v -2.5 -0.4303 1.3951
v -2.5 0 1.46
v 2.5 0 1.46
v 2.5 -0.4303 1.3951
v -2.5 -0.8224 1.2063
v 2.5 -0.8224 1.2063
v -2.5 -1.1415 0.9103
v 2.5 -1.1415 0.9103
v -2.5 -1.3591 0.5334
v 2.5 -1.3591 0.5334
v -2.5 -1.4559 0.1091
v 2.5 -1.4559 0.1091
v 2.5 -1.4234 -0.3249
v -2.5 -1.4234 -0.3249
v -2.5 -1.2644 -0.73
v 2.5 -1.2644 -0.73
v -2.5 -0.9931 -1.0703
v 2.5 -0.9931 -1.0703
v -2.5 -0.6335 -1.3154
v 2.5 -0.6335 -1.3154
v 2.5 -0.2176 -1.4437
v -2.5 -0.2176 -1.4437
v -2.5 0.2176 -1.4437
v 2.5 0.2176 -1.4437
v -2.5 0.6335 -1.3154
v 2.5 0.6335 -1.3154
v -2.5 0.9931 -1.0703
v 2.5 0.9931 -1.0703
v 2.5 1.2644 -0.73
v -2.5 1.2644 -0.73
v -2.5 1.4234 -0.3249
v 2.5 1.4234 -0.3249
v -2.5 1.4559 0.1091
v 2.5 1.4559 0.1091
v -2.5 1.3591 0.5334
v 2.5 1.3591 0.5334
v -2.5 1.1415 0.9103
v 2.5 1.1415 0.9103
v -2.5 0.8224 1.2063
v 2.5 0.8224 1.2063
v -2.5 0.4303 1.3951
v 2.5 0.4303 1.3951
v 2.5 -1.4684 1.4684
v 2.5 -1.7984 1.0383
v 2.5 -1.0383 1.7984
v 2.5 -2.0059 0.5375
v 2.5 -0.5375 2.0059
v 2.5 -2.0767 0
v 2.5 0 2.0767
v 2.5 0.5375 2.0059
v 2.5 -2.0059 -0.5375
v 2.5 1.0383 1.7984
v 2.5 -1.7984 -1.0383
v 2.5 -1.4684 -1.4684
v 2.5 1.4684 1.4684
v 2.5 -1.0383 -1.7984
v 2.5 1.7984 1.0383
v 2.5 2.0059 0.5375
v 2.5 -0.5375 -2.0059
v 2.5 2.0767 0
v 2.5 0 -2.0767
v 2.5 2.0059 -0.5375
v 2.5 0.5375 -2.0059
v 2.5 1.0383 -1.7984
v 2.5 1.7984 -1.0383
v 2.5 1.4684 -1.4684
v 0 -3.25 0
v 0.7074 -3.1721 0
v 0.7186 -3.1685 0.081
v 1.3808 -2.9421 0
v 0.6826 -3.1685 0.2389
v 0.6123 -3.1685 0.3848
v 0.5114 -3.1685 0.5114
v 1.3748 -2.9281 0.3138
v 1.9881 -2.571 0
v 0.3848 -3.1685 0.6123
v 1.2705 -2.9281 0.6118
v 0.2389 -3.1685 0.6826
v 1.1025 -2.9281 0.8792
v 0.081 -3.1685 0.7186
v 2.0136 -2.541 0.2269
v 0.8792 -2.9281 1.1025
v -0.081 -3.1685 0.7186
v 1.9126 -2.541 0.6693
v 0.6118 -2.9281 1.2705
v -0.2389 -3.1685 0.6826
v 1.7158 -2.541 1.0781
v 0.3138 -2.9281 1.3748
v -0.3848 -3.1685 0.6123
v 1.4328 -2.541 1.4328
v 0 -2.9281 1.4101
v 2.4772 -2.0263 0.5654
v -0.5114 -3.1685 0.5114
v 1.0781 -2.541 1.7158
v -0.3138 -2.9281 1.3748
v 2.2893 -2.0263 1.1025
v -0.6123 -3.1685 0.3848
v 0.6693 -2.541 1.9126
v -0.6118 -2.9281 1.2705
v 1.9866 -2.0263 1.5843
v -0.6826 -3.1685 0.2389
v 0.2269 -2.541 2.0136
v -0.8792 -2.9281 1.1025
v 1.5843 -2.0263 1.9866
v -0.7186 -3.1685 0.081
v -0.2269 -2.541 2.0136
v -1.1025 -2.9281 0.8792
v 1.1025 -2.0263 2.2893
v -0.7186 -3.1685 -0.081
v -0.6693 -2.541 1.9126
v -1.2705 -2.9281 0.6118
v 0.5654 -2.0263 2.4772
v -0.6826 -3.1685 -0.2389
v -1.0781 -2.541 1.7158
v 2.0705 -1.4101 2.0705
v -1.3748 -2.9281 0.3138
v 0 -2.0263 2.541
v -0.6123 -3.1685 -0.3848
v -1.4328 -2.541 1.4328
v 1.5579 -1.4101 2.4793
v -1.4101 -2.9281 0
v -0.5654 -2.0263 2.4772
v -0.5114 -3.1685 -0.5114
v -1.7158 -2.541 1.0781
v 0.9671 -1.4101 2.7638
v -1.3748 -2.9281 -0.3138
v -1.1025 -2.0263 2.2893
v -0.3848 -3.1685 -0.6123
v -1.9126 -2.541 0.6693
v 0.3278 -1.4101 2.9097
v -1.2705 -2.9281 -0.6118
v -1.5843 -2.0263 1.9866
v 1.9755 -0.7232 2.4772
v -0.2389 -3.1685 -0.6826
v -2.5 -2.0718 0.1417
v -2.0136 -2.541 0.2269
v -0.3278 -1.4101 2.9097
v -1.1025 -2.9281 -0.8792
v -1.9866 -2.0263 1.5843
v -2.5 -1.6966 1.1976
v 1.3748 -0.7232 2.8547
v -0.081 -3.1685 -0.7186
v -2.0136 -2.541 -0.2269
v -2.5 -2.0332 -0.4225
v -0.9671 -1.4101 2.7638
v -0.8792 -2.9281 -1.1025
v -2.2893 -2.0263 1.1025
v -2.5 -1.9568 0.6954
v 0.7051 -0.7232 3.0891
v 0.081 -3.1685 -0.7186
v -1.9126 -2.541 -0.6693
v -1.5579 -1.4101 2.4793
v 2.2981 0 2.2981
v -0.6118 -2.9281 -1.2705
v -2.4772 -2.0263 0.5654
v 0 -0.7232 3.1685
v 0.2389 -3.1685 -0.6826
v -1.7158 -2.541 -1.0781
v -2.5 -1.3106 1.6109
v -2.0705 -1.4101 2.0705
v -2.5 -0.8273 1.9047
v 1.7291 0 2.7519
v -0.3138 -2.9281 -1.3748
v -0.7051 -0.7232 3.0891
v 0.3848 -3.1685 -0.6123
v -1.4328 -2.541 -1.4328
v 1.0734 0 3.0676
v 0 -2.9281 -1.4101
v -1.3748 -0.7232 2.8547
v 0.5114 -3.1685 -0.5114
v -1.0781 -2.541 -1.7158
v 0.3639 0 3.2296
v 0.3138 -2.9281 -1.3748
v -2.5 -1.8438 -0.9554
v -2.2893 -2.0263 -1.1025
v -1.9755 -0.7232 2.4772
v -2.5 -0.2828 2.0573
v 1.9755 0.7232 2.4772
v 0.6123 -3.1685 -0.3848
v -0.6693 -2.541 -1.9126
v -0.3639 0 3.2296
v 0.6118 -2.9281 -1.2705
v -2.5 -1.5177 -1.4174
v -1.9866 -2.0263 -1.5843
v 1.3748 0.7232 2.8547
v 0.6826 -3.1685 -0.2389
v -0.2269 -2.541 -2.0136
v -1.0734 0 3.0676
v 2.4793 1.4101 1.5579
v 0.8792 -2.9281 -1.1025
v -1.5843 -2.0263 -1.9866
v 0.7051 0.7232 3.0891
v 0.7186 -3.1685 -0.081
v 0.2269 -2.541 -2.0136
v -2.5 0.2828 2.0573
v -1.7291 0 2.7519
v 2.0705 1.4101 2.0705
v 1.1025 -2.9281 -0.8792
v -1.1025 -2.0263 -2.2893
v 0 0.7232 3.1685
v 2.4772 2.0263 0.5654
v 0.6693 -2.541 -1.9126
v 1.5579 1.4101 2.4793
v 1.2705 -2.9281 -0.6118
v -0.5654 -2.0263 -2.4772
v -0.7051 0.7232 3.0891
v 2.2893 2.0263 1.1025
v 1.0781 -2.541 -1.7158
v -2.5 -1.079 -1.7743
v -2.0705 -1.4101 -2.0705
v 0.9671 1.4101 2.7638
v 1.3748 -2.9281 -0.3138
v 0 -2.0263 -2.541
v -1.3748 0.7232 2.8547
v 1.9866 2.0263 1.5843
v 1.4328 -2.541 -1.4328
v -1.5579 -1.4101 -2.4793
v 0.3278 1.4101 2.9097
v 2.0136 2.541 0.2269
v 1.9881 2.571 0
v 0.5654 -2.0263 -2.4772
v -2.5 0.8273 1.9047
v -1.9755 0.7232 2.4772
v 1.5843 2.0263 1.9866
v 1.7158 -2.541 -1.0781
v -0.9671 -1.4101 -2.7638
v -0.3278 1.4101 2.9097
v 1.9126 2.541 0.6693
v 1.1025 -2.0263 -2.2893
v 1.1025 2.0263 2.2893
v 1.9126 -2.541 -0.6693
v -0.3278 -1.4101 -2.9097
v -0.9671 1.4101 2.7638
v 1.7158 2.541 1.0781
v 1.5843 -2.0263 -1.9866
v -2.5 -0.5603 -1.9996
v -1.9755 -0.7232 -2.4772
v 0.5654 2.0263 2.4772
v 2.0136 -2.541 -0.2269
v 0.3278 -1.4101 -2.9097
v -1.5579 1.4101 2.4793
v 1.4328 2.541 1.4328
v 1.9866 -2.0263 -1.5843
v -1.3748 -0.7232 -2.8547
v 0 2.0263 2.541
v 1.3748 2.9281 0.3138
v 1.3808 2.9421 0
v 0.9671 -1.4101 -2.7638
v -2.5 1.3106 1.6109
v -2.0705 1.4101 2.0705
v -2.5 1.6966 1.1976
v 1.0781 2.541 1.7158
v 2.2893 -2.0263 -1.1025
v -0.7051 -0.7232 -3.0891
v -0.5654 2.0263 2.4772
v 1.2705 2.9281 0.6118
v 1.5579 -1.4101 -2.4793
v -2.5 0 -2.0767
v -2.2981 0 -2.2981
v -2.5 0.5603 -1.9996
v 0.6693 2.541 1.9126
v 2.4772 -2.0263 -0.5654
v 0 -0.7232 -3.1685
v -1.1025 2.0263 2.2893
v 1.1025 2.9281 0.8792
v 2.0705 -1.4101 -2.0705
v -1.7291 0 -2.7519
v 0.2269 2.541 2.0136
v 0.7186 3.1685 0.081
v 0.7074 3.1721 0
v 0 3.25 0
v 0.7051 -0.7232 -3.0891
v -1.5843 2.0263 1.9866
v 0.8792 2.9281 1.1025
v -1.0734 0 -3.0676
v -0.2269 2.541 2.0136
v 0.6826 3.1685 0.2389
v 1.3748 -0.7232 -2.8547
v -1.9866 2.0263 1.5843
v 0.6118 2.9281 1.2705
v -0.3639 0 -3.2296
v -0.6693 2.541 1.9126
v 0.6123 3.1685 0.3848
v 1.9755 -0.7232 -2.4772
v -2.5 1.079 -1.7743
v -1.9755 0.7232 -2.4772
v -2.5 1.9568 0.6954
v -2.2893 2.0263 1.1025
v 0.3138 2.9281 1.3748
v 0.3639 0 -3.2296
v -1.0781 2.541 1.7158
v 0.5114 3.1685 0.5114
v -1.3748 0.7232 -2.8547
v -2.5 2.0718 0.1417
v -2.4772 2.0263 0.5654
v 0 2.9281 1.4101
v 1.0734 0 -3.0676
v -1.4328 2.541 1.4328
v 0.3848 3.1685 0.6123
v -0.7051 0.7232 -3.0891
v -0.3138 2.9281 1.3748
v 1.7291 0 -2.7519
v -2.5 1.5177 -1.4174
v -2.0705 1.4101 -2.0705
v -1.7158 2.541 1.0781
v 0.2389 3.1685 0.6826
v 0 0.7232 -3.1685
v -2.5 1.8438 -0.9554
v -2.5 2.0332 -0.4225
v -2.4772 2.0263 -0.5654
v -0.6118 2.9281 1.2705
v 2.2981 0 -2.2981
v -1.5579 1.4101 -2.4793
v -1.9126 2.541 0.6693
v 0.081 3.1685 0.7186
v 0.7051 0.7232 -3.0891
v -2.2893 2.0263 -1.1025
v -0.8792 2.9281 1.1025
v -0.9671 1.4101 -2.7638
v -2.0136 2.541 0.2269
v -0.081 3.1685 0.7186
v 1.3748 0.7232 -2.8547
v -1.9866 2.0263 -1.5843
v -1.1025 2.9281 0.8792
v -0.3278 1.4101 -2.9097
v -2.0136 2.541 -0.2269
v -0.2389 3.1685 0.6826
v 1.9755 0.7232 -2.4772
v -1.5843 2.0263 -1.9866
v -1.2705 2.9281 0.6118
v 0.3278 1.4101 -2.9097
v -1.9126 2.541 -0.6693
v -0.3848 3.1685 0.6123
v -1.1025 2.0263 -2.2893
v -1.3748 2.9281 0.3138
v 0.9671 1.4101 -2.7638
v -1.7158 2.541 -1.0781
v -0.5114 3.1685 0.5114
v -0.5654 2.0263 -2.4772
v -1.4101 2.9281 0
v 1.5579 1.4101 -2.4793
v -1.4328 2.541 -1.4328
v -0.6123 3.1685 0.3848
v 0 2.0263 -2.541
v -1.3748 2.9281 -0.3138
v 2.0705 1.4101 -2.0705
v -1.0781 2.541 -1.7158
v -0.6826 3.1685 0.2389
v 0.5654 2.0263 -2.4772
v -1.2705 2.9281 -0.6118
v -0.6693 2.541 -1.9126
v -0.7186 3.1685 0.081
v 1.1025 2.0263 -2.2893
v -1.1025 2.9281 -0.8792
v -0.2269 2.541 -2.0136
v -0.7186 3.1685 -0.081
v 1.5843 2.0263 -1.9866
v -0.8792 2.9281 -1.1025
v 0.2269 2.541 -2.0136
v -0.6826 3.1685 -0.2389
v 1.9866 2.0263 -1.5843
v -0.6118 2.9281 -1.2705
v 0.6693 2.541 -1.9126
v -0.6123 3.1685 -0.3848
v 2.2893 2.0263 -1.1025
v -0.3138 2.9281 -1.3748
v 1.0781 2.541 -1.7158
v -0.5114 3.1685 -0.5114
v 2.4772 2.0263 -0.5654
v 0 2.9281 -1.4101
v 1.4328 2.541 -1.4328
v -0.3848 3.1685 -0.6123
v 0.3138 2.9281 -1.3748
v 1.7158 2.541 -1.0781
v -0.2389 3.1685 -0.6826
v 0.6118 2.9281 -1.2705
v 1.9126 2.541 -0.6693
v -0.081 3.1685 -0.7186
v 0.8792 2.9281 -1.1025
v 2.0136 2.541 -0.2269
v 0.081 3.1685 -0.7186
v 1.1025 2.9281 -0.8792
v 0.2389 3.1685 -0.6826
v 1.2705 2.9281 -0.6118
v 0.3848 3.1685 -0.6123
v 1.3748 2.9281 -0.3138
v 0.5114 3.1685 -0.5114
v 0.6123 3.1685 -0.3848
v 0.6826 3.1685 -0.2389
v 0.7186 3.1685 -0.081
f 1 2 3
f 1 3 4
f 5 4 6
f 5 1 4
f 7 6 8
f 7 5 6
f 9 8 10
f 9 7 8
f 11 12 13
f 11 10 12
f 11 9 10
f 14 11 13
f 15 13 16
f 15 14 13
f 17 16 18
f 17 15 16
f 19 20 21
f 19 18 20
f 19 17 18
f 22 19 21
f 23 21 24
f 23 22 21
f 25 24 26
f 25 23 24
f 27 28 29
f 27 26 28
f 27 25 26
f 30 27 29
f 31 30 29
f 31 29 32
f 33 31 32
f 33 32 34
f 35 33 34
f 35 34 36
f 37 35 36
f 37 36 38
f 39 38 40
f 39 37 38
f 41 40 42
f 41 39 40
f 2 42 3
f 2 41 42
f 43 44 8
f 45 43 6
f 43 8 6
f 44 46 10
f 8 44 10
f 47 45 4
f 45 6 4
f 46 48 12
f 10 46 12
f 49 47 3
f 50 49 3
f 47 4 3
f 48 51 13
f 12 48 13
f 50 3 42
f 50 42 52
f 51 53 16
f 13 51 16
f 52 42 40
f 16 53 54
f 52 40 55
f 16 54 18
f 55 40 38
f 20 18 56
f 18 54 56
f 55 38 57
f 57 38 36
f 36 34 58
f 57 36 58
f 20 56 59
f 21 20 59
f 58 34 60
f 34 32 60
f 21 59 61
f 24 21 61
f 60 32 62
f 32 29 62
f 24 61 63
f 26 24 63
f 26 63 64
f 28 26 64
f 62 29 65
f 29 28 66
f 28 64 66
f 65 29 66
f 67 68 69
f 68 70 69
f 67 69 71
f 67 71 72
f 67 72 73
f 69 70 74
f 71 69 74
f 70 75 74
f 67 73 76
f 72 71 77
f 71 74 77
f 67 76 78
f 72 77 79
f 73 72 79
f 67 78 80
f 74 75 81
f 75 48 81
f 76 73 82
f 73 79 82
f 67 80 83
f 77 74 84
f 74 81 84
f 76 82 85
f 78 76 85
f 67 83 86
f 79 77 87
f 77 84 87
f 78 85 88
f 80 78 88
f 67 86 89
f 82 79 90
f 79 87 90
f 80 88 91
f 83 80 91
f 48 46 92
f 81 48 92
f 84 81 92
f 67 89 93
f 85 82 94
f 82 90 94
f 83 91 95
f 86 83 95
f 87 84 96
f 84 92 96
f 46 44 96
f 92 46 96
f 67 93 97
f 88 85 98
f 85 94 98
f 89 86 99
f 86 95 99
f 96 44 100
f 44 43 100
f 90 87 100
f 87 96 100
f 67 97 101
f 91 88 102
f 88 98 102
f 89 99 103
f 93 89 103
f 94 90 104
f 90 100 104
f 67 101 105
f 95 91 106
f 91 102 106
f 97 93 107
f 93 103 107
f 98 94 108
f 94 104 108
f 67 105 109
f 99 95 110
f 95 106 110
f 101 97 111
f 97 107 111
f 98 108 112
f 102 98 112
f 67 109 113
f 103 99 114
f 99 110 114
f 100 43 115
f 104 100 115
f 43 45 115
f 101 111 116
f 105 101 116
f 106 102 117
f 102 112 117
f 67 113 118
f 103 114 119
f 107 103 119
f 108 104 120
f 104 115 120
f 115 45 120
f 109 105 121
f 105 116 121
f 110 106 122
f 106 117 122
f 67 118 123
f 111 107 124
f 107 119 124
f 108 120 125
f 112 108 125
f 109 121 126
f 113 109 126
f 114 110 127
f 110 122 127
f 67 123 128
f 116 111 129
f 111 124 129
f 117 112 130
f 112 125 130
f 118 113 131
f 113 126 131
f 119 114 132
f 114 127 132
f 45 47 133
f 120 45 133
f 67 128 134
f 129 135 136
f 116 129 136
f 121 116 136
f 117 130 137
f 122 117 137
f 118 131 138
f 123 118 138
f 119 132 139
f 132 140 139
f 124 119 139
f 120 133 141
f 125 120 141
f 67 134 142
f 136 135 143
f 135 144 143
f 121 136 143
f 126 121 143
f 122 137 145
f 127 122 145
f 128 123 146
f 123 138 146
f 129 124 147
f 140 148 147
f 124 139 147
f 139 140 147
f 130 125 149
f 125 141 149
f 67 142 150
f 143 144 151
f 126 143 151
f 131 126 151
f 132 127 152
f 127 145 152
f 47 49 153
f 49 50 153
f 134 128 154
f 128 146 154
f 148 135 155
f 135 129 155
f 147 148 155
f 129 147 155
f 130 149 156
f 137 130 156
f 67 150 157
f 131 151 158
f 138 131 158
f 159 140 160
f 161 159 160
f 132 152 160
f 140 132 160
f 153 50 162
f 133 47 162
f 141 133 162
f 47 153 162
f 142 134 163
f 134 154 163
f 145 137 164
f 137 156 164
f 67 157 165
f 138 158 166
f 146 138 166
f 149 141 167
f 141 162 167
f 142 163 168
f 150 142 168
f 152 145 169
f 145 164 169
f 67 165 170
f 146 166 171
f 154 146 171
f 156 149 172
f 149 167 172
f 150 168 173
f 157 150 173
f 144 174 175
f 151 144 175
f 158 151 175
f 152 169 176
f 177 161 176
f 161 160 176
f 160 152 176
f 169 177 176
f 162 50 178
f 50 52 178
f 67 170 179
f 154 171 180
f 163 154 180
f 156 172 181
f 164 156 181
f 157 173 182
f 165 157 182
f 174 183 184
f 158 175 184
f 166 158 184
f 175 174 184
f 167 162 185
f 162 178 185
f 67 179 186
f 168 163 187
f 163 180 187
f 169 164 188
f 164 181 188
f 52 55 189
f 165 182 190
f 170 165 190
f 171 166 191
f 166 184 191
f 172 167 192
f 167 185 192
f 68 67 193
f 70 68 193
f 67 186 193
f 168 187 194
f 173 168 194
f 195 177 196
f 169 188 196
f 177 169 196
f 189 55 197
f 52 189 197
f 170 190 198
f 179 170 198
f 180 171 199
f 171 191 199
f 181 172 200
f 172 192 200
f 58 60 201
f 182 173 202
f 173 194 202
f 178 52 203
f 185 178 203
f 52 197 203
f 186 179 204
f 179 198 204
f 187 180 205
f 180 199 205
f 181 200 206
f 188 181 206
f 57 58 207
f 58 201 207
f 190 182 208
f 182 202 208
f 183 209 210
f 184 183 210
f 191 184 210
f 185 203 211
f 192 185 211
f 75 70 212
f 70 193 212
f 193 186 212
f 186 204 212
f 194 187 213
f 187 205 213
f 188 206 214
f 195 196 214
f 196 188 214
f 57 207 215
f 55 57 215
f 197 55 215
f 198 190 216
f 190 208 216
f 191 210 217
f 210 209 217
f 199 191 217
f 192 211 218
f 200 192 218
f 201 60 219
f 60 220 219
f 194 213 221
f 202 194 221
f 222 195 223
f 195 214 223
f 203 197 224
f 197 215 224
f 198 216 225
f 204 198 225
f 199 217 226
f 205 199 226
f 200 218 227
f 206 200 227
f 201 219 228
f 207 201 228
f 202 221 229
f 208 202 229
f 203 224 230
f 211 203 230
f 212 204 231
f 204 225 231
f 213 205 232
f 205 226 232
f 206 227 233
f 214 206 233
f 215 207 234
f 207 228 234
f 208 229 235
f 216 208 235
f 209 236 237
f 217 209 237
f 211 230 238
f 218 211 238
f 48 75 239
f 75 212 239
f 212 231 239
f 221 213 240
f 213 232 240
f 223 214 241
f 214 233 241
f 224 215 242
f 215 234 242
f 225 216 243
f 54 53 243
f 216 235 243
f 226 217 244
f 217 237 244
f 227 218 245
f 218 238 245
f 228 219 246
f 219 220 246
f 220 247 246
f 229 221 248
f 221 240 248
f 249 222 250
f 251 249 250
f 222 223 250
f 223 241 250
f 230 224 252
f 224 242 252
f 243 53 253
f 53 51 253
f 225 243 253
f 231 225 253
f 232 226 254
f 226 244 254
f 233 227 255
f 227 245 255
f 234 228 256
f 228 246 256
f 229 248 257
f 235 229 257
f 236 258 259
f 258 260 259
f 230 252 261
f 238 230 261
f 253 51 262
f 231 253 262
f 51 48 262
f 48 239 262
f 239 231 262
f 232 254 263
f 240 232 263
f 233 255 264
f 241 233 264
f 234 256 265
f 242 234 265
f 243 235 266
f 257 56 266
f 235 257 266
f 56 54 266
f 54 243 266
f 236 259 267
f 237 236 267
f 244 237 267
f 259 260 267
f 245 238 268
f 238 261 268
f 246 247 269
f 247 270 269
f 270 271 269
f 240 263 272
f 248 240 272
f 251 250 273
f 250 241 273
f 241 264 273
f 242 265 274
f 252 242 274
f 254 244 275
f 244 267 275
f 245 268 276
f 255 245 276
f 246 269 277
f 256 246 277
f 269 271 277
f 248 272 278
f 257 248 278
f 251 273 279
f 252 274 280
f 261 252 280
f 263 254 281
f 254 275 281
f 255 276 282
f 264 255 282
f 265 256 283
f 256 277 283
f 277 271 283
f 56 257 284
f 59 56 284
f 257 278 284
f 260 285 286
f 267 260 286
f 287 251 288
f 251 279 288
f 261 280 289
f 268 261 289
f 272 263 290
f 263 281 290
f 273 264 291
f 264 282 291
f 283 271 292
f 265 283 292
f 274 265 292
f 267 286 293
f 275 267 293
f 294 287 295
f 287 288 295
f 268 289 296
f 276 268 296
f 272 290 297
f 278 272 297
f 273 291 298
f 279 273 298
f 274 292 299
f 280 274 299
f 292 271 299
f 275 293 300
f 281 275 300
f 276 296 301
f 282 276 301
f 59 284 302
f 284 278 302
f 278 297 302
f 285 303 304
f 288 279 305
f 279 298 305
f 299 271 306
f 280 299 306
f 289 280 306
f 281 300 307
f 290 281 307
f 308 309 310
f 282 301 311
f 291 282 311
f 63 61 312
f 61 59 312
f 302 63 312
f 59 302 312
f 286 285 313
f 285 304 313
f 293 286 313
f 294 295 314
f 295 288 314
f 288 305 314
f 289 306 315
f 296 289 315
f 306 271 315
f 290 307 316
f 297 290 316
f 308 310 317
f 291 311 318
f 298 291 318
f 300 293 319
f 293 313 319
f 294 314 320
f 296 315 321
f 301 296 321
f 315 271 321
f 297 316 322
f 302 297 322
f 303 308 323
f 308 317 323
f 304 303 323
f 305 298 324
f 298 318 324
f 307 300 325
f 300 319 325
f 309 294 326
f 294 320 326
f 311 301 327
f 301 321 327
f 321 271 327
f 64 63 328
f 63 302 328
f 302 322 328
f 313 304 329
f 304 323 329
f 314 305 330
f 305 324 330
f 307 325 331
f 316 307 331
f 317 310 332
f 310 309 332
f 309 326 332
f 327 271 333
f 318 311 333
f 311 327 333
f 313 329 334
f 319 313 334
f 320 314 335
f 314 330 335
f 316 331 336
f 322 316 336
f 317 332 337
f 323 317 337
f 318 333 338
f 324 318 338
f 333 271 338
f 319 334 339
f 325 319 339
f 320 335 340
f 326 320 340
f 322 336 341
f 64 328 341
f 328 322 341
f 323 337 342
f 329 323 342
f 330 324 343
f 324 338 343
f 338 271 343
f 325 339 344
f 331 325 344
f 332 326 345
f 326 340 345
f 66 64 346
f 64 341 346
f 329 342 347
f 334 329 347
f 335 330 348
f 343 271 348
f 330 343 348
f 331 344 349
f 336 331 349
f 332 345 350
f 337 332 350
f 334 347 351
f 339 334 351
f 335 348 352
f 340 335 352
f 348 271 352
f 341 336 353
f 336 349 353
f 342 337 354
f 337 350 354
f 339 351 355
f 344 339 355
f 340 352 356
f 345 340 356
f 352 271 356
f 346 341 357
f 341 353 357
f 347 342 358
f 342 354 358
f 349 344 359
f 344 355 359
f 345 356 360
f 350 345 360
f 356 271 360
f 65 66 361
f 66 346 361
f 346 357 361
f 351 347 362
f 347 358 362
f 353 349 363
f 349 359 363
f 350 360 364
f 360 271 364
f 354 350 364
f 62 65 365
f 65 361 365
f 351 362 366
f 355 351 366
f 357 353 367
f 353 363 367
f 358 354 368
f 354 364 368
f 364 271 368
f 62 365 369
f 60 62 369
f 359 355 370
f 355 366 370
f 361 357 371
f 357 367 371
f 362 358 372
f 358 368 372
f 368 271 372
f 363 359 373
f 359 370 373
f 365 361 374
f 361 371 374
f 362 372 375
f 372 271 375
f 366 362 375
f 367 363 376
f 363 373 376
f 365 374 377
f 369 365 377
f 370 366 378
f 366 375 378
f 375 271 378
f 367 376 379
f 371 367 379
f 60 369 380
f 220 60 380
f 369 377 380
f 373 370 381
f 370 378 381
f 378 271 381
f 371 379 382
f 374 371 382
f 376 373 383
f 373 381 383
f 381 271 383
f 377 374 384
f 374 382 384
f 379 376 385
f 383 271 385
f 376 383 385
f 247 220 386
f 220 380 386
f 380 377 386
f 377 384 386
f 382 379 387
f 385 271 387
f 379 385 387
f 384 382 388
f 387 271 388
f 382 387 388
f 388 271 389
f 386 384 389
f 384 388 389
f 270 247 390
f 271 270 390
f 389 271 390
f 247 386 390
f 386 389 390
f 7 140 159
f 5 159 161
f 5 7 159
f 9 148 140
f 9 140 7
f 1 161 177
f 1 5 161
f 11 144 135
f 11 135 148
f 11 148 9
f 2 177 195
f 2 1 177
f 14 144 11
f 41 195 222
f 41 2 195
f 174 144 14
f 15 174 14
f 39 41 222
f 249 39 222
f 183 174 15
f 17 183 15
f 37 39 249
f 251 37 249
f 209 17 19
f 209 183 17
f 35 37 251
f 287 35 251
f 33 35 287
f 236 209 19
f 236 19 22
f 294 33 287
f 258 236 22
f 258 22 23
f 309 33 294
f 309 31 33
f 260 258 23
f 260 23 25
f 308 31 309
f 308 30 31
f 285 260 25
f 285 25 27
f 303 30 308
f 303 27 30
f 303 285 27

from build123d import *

# Parameters (mm, degrees)
TAGLIO_ESTRUSIONE1_DEPTH      = 6.629165125
TAGLIO_ESTRUSIONE1_DEPTH_BACK = 6.629165125
SCHIZZO2_R                    = 1.46
TAGLIO_ESTRUSIONE2_DEPTH      = 6.436533822
TAGLIO_ESTRUSIONE2_DEPTH_BACK = 6.436533822
SCHIZZO3_W                    = 0.403601212
SCHIZZO3_H                    = 6.501424145


with BuildPart() as part:
    # Schizzo1 → Rivoluzione1 (revolve)
    with BuildSketch(Plane.XY):
        with BuildLine():
            Line((0, 3.25), (0, -3.25))
            ThreePointArc((0, -3.25), (3.25, 0), (0, 3.25))
        make_face()
    revolve(axis=Axis((0, 3.25, 0), (0, -1, 0)))

    # Schizzo2 → Taglio-Estrusione1 (cut, two sides: drawn at the far end of the back side and taken through both)
    with BuildSketch(Plane(origin=(0, 0, 0), x_dir=(0, 0, -1), z_dir=(1, 0, 0)).offset(-TAGLIO_ESTRUSIONE1_DEPTH_BACK)):
        with Locations(Location((0, 0, 0), (0, 0, 180))):
            Circle(SCHIZZO2_R)
    extrude(amount=TAGLIO_ESTRUSIONE1_DEPTH + TAGLIO_ESTRUSIONE1_DEPTH_BACK, mode=Mode.SUBTRACT)

    # Schizzo3 → Taglio-Estrusione2 (cut, two sides: drawn at the far end of the back side and taken through both)
    with BuildSketch(Plane.XY.offset(-TAGLIO_ESTRUSIONE2_DEPTH_BACK)):
        with Locations((2.701800606, 0.000712073)):
            Rectangle(SCHIZZO3_W, SCHIZZO3_H)
        with Locations((-2.701800606, 0.000712073)):
            Rectangle(SCHIZZO3_W, SCHIZZO3_H)
    extrude(amount=TAGLIO_ESTRUSIONE2_DEPTH + TAGLIO_ESTRUSIONE2_DEPTH_BACK, mode=Mode.SUBTRACT)


solid = part.part
